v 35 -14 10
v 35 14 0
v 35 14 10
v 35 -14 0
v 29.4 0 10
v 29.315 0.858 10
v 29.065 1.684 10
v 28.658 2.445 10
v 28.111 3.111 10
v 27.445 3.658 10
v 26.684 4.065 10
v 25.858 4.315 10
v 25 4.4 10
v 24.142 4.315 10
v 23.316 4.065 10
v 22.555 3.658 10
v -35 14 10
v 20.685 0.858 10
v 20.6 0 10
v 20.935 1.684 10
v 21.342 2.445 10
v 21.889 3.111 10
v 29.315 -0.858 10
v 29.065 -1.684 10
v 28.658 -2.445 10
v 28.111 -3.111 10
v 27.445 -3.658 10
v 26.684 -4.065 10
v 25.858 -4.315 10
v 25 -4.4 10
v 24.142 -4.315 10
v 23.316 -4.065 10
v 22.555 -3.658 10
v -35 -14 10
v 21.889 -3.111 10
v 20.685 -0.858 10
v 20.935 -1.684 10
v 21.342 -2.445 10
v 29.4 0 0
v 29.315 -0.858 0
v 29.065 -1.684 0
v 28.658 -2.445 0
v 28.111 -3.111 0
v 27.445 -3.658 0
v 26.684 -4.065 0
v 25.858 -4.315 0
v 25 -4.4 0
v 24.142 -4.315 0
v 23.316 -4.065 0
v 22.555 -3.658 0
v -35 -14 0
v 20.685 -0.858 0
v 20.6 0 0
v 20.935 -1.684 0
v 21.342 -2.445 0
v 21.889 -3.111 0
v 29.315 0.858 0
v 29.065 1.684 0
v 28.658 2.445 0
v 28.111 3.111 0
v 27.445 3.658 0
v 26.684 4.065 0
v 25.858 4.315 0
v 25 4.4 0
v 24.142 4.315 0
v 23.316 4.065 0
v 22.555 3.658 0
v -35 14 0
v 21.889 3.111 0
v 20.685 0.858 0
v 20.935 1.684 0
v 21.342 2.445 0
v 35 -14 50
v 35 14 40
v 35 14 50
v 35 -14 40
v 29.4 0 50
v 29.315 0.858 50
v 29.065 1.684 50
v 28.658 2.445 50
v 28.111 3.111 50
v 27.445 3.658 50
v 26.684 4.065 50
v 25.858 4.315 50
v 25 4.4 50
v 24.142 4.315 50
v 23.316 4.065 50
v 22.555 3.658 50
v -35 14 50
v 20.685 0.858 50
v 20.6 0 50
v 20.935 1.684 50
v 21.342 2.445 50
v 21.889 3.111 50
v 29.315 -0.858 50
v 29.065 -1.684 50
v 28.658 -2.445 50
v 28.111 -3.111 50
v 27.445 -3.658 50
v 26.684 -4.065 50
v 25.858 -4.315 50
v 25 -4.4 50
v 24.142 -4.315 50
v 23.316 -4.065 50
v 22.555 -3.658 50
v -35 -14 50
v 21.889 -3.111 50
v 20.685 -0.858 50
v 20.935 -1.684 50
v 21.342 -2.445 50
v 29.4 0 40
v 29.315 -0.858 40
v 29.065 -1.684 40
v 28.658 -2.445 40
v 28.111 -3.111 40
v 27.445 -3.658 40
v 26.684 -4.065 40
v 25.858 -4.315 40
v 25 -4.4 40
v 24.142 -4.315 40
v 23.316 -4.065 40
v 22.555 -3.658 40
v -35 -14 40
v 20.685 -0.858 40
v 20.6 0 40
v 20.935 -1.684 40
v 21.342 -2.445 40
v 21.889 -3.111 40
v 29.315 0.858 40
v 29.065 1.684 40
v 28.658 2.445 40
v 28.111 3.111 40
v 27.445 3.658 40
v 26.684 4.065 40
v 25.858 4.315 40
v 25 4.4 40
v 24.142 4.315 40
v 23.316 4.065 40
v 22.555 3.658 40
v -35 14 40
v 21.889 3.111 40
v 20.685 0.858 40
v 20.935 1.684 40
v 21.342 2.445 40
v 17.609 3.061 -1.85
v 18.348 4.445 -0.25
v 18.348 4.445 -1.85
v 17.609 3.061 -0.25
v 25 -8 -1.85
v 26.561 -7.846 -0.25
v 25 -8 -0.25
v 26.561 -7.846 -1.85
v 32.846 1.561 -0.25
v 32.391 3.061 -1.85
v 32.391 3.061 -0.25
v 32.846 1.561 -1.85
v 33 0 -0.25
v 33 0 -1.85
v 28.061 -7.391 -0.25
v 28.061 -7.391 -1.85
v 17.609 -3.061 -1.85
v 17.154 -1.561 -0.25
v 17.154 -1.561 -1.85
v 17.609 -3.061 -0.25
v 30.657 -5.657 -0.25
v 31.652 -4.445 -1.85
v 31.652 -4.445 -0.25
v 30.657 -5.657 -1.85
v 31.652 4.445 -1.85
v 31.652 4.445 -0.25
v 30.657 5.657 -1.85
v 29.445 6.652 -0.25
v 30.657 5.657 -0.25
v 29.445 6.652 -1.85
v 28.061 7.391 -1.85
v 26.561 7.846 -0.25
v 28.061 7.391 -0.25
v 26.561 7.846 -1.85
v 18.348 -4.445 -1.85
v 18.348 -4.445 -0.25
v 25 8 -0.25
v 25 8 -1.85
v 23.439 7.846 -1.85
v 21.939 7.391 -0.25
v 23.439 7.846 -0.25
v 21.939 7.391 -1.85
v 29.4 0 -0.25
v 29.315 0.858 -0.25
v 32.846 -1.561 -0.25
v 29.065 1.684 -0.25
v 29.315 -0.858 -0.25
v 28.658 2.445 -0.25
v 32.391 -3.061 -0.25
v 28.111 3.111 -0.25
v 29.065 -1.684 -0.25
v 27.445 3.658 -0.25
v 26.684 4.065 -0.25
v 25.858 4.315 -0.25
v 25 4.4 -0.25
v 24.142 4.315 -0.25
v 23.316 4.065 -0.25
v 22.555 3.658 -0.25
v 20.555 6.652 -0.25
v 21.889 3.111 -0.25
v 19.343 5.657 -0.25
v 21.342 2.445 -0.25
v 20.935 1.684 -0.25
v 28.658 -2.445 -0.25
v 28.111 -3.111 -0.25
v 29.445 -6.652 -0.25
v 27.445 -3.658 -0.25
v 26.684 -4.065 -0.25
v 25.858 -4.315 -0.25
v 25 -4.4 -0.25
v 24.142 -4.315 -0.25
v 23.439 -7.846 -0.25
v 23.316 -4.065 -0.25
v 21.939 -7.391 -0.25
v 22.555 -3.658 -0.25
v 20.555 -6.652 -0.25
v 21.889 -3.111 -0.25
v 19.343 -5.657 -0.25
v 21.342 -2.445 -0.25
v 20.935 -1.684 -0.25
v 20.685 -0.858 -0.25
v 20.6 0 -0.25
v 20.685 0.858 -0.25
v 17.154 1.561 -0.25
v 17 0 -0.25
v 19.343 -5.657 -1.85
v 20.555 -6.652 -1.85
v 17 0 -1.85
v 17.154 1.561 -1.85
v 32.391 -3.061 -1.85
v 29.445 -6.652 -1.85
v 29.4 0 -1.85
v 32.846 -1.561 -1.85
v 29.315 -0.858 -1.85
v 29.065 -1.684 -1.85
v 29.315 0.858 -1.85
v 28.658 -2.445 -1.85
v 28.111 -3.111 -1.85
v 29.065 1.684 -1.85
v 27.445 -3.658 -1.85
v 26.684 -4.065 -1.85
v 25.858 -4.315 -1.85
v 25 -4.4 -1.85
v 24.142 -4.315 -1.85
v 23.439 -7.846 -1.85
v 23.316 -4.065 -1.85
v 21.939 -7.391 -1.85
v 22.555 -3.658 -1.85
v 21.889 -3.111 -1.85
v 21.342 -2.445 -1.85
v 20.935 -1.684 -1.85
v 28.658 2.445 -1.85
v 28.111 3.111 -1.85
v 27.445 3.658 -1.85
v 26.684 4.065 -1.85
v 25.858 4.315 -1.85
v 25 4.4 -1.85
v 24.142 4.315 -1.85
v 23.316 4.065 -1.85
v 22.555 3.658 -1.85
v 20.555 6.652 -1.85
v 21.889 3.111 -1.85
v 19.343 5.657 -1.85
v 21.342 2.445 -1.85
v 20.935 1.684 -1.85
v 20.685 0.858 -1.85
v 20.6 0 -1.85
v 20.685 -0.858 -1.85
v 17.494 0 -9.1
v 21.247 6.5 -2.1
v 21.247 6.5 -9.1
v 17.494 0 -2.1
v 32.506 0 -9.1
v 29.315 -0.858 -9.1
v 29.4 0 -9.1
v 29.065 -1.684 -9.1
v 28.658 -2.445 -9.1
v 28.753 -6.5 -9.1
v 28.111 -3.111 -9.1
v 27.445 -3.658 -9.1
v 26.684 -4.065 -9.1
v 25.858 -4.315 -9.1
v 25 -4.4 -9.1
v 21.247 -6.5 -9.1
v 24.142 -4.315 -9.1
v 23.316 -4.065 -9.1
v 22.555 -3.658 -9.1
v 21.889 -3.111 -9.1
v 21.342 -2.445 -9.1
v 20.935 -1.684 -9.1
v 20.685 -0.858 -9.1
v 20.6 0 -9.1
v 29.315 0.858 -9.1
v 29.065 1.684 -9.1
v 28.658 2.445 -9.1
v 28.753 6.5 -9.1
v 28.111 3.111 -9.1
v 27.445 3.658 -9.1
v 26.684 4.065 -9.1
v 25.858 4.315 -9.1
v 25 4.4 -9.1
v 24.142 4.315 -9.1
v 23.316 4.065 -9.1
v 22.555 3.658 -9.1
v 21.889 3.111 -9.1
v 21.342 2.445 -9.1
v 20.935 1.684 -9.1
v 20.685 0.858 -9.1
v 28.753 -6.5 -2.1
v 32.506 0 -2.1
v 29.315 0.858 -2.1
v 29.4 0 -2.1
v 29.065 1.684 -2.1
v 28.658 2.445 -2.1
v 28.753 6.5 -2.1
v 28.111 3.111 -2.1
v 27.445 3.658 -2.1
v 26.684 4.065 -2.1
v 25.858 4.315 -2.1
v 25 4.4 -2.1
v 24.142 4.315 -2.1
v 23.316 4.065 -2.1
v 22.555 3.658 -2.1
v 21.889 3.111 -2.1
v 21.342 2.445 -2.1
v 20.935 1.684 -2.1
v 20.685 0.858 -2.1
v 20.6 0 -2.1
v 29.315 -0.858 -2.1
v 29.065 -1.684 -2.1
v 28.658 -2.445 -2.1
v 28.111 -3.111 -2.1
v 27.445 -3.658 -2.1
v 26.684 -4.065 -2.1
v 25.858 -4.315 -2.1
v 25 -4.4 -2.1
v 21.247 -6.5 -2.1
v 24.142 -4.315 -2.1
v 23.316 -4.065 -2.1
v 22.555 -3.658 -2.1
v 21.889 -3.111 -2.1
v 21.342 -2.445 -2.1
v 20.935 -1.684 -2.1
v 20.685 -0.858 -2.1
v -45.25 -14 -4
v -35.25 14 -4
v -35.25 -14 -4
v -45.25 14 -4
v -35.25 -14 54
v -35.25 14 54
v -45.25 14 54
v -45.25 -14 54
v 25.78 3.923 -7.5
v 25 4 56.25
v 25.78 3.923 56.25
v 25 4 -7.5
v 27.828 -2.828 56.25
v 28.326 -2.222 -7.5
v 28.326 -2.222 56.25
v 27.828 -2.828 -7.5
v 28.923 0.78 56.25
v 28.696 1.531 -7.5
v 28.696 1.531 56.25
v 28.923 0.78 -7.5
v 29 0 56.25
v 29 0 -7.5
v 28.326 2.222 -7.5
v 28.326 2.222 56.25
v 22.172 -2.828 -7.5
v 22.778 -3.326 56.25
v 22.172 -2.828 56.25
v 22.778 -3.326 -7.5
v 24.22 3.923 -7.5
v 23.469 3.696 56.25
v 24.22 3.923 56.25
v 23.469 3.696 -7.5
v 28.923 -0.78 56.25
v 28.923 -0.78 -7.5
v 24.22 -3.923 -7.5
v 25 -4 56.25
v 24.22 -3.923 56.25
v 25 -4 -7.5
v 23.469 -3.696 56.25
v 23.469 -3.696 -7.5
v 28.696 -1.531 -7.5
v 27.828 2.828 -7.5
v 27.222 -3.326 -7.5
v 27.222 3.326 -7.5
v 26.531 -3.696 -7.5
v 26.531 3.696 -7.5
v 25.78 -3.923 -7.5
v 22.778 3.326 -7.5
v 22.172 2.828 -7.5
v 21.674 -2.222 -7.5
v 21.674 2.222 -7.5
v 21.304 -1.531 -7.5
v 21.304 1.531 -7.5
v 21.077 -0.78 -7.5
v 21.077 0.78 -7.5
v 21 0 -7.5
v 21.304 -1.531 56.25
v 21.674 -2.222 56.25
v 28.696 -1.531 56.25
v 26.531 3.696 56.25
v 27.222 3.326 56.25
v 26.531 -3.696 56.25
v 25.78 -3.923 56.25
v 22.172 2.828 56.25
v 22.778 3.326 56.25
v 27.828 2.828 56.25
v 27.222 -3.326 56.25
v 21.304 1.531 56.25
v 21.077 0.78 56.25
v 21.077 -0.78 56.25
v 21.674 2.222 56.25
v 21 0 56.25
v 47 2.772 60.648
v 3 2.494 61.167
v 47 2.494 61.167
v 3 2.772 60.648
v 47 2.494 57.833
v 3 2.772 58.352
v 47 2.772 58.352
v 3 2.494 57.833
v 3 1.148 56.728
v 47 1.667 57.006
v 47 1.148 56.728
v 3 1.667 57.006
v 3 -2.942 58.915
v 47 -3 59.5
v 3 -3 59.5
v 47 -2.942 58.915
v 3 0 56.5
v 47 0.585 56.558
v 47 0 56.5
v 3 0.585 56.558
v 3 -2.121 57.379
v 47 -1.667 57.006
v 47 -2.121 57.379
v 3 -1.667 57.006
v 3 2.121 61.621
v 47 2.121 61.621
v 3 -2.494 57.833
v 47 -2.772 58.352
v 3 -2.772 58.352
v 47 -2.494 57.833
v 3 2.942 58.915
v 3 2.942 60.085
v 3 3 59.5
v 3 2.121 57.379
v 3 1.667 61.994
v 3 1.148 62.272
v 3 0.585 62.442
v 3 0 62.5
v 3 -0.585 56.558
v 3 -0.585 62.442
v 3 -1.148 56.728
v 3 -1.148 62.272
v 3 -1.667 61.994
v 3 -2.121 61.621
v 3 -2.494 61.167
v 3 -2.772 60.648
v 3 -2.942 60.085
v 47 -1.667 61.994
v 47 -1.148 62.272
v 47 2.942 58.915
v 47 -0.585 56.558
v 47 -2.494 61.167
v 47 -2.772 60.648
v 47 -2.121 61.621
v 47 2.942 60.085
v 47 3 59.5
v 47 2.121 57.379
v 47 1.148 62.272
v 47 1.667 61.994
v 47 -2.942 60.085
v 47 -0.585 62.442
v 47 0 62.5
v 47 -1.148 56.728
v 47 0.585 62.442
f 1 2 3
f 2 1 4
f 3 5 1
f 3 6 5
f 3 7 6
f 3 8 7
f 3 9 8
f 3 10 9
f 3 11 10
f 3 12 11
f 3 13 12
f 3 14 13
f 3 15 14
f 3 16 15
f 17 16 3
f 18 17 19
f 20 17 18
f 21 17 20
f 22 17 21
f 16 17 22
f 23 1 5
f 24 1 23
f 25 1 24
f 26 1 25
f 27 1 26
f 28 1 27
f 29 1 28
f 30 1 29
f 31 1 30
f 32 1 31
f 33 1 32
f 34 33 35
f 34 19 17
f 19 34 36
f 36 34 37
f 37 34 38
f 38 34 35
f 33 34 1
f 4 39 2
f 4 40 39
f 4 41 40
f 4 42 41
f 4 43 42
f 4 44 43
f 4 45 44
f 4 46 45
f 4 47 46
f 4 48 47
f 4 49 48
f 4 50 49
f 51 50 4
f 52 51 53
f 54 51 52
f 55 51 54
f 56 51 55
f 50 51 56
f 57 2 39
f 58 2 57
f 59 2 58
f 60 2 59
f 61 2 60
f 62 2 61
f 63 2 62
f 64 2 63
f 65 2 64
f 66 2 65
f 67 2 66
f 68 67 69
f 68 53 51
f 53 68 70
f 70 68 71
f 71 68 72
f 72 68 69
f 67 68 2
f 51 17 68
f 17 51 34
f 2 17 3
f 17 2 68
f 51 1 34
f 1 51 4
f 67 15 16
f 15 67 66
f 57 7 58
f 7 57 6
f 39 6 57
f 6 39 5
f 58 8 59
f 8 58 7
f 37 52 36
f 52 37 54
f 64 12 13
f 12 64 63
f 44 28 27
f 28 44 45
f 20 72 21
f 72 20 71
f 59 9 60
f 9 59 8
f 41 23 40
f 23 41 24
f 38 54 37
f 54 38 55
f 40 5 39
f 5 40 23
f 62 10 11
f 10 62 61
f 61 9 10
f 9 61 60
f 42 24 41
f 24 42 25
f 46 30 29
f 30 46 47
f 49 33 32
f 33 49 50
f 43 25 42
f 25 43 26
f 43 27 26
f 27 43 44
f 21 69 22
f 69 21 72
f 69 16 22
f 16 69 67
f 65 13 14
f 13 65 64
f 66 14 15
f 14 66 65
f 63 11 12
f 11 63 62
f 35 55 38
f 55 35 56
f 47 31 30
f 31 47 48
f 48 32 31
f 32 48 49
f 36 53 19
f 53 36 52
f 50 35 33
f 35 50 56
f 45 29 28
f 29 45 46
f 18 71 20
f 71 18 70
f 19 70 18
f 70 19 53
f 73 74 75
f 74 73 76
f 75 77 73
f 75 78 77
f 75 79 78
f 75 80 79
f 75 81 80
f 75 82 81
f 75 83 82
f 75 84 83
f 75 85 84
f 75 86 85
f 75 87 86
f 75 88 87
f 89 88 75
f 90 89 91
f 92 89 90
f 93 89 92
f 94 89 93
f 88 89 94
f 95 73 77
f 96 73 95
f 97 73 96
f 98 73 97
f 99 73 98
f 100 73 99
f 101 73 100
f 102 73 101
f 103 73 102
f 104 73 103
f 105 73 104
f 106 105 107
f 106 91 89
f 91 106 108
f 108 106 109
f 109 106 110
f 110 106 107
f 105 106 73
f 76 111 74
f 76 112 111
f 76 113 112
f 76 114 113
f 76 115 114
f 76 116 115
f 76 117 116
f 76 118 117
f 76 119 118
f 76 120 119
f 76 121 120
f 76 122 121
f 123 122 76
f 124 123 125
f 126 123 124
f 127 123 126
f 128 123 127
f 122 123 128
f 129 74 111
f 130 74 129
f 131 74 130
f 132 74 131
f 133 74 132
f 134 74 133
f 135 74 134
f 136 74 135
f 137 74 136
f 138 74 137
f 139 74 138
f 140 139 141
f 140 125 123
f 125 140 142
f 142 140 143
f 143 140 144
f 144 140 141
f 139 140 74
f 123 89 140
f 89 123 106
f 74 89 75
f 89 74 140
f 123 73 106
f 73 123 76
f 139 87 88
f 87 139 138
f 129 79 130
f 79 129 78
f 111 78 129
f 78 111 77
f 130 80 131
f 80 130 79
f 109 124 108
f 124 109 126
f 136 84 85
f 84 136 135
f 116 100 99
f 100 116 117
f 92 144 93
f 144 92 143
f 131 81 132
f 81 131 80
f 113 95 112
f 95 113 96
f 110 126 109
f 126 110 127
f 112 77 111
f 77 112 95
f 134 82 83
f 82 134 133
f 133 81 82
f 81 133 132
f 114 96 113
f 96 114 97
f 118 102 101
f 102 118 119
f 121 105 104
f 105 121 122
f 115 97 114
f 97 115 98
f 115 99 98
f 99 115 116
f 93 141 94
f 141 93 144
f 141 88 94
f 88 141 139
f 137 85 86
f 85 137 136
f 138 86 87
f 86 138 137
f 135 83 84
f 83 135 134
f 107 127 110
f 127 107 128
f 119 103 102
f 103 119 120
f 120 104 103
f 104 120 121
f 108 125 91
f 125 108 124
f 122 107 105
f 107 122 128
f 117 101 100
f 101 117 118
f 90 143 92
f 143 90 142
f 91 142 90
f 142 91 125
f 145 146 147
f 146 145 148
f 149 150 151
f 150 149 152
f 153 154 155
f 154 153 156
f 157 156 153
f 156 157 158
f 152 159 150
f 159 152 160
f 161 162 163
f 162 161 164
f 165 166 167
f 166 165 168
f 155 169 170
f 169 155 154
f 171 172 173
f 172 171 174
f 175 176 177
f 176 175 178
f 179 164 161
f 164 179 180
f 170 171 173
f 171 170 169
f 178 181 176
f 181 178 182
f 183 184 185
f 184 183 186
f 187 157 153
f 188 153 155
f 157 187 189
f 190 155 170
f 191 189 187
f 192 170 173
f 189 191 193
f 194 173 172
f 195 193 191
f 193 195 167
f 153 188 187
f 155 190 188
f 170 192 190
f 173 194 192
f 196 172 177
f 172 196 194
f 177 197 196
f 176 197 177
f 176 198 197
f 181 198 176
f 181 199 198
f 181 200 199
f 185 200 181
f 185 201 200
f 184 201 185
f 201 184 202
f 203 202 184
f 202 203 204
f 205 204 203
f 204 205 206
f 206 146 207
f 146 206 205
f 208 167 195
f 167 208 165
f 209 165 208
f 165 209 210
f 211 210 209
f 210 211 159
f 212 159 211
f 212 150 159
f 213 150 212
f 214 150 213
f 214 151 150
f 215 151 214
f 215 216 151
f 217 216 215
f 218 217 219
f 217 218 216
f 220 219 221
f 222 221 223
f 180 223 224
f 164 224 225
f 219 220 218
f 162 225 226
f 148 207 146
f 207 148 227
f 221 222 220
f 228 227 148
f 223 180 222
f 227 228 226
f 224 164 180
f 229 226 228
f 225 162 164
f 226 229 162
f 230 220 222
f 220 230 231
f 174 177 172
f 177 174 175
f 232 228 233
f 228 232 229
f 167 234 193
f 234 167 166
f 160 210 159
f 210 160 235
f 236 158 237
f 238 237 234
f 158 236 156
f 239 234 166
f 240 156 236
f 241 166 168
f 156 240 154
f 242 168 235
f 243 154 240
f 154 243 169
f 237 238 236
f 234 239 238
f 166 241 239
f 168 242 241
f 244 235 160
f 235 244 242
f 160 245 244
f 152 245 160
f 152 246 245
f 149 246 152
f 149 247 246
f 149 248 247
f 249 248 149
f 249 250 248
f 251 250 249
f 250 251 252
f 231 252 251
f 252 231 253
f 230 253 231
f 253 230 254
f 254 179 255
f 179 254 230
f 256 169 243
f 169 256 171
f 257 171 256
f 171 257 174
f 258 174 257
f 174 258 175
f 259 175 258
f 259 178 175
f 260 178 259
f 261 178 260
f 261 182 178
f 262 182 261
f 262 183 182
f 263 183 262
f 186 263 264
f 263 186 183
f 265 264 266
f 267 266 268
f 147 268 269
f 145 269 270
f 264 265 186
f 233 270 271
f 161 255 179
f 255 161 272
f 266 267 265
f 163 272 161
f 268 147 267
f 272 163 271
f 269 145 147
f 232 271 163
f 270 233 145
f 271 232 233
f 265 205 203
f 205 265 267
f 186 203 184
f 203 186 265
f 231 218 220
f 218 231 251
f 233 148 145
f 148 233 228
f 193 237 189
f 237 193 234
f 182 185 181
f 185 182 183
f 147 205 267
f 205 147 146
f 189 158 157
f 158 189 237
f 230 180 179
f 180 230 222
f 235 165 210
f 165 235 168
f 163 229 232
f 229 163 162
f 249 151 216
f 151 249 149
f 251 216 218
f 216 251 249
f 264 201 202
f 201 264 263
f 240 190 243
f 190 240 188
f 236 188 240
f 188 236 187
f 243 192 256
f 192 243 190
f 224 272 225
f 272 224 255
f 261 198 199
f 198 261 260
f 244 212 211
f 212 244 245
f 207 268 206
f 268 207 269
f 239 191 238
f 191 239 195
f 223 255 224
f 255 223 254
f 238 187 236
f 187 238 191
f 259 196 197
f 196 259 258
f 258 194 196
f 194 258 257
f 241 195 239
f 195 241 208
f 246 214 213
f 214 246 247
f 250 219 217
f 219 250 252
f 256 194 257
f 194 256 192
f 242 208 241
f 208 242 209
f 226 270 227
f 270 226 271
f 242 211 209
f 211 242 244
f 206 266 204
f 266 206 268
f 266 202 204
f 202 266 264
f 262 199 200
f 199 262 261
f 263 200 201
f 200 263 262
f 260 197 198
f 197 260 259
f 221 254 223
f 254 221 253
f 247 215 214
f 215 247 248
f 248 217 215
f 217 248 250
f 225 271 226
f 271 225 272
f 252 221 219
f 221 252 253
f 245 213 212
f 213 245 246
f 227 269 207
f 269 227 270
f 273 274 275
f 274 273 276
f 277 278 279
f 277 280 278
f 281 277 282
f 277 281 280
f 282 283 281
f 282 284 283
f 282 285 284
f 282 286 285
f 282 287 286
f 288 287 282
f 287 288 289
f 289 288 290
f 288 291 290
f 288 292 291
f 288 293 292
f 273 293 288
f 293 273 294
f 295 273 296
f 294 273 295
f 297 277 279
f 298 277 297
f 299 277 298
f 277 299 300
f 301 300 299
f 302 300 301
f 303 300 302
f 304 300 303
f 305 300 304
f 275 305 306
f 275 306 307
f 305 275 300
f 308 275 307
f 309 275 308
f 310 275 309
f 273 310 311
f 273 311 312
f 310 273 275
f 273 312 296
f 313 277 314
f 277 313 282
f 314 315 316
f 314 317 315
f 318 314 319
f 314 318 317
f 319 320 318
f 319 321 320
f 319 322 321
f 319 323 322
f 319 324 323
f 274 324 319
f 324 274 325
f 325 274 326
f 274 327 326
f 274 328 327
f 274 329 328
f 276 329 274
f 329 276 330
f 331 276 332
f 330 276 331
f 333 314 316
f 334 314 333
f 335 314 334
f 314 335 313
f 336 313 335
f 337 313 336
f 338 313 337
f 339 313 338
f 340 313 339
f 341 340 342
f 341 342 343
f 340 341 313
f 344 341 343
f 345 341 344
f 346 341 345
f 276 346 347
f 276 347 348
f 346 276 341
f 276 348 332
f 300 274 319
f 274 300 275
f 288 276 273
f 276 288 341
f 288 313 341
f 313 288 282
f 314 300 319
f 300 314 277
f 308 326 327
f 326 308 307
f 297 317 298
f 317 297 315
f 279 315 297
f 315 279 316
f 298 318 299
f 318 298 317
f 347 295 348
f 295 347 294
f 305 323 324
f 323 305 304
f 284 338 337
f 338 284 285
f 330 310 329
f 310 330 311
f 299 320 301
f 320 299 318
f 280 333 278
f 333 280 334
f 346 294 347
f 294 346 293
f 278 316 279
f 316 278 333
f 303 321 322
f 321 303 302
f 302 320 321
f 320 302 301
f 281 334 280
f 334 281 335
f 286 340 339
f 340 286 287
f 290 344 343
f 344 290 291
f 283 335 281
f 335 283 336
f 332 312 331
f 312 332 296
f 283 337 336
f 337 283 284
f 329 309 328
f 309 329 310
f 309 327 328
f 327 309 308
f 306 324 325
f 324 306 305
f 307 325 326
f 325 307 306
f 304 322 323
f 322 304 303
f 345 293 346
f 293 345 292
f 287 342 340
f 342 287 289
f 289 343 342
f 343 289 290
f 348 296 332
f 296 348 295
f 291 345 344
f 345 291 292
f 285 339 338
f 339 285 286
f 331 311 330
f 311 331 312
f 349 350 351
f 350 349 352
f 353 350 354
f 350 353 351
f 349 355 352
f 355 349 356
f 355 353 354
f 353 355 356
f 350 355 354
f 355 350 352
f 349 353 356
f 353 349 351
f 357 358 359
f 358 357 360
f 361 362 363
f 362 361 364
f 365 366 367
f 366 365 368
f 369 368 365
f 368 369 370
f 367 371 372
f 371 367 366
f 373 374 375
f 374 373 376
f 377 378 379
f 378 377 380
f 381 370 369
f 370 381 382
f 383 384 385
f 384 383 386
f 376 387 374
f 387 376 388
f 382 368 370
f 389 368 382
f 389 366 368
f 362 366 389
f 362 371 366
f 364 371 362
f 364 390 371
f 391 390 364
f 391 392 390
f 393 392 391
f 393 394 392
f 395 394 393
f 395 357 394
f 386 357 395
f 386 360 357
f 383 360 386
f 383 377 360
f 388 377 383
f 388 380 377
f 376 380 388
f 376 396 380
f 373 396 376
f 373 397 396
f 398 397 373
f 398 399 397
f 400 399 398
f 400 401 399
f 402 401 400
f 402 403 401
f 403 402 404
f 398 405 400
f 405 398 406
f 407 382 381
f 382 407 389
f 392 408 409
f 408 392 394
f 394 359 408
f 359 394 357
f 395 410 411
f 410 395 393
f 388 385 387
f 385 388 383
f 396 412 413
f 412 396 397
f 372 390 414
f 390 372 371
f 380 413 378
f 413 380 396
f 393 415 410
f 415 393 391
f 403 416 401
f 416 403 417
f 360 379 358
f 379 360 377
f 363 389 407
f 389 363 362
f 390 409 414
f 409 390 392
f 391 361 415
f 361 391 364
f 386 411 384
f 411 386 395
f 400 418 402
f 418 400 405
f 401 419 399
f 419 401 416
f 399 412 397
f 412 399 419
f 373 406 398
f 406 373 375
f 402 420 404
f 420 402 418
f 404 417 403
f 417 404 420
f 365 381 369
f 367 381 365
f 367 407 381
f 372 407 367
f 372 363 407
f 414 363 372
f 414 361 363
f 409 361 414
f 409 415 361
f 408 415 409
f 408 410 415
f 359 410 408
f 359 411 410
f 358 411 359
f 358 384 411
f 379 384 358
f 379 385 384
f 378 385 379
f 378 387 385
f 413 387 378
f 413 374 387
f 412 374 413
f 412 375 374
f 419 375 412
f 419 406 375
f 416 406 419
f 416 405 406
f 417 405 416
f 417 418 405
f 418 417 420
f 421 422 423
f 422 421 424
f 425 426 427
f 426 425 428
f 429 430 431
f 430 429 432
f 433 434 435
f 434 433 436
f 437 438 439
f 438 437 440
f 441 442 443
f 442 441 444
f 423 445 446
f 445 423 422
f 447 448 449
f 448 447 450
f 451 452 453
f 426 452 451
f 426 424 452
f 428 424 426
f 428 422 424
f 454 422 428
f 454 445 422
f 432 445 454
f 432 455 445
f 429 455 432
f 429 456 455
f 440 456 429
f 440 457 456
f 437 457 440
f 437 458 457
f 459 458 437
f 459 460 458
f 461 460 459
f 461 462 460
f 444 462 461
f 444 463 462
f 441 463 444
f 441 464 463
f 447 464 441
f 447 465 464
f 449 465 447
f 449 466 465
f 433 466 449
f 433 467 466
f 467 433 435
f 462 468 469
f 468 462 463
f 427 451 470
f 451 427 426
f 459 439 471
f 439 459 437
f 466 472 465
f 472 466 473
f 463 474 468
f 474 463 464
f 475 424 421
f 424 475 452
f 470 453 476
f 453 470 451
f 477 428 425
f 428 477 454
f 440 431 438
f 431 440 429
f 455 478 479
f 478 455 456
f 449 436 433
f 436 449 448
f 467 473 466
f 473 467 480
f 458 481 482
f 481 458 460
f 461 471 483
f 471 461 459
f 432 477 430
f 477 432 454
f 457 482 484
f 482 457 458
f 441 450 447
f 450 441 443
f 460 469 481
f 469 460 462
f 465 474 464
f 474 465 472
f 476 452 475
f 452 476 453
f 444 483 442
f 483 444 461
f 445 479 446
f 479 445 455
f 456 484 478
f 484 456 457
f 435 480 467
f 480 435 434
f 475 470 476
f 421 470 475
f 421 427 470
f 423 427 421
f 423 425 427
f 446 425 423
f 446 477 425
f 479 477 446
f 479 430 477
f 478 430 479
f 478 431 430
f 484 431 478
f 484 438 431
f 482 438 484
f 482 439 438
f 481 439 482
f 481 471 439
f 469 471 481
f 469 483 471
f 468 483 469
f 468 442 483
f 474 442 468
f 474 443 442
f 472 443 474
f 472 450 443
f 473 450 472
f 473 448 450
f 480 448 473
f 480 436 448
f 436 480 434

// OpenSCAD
$fn = 32;

// ------------------------------------------------------------------------
// C clamp: throat 40 mm, screw d8
// Every part is its own module, assembly() places every instance.
// ------------------------------------------------------------------------

// --- part 1 ---
module clamp_arm() {
  difference() {
    translate([-35, -14, 0]) cube([70, 28, 10]);
    translate([25, 0, -1]) cylinder(h = 12, d = 8.8);
  }
}

// --- part 2 ---
module clamp_spine() {
  difference() {
    translate([-29, -14, 0]) cube([58, 28, 10]);
  }
}

// --- part 3 ---
module clamp_screw() {
  translate([0, 0, -31.875]) cylinder(h = 63.75, d = 8);
}

// --- part 4 ---
module clamp_washer() {
  difference() {
      translate([0, 0, 0]) cylinder(h = 1.6, d = 16);
      translate([0, 0, -1]) cylinder(h = 3.6, d = 8.8);
    }
}

// --- part 5 ---
module clamp_nut() {
  difference() {
    linear_extrude(height = 7) polygon(points = [[7.506, 0], [3.753, 6.5], [-3.753, 6.5], [-7.506, 0], [-3.753, -6.5], [3.753, -6.5]]);
    translate([0, 0, -1]) cylinder(h = 9, d = 8.8);
  }
}

// --- part 6 ---
module tommy_bar() {
  translate([0, 0, -22]) cylinder(h = 44, d = 6);
}

// --- assembly ---
module assembly() {
  color([0.80, 0.24, 0.20]) translate([0, 0, 0]) rotate([0, 0, 0]) clamp_arm();
  color([0.20, 0.45, 0.75]) translate([0, 0, 40]) rotate([0, 0, 0]) clamp_arm();
  color([0.25, 0.62, 0.32]) translate([-45.25, 0, 25]) rotate([0, 90, 0]) clamp_spine();
  color([0.92, 0.70, 0.18]) translate([25, 0, 24.375]) rotate([0, 0, 0]) clamp_screw();
  color([0.58, 0.35, 0.70]) translate([25, 0, -1.85]) rotate([0, 0, 0]) clamp_washer();
  color([0.16, 0.66, 0.66]) translate([25, 0, -9.1]) rotate([0, 0, 0]) clamp_nut();
  color([0.85, 0.48, 0.18]) translate([25, 0, 59.5]) rotate([0, 90, 0]) tommy_bar();
}

assembly();
